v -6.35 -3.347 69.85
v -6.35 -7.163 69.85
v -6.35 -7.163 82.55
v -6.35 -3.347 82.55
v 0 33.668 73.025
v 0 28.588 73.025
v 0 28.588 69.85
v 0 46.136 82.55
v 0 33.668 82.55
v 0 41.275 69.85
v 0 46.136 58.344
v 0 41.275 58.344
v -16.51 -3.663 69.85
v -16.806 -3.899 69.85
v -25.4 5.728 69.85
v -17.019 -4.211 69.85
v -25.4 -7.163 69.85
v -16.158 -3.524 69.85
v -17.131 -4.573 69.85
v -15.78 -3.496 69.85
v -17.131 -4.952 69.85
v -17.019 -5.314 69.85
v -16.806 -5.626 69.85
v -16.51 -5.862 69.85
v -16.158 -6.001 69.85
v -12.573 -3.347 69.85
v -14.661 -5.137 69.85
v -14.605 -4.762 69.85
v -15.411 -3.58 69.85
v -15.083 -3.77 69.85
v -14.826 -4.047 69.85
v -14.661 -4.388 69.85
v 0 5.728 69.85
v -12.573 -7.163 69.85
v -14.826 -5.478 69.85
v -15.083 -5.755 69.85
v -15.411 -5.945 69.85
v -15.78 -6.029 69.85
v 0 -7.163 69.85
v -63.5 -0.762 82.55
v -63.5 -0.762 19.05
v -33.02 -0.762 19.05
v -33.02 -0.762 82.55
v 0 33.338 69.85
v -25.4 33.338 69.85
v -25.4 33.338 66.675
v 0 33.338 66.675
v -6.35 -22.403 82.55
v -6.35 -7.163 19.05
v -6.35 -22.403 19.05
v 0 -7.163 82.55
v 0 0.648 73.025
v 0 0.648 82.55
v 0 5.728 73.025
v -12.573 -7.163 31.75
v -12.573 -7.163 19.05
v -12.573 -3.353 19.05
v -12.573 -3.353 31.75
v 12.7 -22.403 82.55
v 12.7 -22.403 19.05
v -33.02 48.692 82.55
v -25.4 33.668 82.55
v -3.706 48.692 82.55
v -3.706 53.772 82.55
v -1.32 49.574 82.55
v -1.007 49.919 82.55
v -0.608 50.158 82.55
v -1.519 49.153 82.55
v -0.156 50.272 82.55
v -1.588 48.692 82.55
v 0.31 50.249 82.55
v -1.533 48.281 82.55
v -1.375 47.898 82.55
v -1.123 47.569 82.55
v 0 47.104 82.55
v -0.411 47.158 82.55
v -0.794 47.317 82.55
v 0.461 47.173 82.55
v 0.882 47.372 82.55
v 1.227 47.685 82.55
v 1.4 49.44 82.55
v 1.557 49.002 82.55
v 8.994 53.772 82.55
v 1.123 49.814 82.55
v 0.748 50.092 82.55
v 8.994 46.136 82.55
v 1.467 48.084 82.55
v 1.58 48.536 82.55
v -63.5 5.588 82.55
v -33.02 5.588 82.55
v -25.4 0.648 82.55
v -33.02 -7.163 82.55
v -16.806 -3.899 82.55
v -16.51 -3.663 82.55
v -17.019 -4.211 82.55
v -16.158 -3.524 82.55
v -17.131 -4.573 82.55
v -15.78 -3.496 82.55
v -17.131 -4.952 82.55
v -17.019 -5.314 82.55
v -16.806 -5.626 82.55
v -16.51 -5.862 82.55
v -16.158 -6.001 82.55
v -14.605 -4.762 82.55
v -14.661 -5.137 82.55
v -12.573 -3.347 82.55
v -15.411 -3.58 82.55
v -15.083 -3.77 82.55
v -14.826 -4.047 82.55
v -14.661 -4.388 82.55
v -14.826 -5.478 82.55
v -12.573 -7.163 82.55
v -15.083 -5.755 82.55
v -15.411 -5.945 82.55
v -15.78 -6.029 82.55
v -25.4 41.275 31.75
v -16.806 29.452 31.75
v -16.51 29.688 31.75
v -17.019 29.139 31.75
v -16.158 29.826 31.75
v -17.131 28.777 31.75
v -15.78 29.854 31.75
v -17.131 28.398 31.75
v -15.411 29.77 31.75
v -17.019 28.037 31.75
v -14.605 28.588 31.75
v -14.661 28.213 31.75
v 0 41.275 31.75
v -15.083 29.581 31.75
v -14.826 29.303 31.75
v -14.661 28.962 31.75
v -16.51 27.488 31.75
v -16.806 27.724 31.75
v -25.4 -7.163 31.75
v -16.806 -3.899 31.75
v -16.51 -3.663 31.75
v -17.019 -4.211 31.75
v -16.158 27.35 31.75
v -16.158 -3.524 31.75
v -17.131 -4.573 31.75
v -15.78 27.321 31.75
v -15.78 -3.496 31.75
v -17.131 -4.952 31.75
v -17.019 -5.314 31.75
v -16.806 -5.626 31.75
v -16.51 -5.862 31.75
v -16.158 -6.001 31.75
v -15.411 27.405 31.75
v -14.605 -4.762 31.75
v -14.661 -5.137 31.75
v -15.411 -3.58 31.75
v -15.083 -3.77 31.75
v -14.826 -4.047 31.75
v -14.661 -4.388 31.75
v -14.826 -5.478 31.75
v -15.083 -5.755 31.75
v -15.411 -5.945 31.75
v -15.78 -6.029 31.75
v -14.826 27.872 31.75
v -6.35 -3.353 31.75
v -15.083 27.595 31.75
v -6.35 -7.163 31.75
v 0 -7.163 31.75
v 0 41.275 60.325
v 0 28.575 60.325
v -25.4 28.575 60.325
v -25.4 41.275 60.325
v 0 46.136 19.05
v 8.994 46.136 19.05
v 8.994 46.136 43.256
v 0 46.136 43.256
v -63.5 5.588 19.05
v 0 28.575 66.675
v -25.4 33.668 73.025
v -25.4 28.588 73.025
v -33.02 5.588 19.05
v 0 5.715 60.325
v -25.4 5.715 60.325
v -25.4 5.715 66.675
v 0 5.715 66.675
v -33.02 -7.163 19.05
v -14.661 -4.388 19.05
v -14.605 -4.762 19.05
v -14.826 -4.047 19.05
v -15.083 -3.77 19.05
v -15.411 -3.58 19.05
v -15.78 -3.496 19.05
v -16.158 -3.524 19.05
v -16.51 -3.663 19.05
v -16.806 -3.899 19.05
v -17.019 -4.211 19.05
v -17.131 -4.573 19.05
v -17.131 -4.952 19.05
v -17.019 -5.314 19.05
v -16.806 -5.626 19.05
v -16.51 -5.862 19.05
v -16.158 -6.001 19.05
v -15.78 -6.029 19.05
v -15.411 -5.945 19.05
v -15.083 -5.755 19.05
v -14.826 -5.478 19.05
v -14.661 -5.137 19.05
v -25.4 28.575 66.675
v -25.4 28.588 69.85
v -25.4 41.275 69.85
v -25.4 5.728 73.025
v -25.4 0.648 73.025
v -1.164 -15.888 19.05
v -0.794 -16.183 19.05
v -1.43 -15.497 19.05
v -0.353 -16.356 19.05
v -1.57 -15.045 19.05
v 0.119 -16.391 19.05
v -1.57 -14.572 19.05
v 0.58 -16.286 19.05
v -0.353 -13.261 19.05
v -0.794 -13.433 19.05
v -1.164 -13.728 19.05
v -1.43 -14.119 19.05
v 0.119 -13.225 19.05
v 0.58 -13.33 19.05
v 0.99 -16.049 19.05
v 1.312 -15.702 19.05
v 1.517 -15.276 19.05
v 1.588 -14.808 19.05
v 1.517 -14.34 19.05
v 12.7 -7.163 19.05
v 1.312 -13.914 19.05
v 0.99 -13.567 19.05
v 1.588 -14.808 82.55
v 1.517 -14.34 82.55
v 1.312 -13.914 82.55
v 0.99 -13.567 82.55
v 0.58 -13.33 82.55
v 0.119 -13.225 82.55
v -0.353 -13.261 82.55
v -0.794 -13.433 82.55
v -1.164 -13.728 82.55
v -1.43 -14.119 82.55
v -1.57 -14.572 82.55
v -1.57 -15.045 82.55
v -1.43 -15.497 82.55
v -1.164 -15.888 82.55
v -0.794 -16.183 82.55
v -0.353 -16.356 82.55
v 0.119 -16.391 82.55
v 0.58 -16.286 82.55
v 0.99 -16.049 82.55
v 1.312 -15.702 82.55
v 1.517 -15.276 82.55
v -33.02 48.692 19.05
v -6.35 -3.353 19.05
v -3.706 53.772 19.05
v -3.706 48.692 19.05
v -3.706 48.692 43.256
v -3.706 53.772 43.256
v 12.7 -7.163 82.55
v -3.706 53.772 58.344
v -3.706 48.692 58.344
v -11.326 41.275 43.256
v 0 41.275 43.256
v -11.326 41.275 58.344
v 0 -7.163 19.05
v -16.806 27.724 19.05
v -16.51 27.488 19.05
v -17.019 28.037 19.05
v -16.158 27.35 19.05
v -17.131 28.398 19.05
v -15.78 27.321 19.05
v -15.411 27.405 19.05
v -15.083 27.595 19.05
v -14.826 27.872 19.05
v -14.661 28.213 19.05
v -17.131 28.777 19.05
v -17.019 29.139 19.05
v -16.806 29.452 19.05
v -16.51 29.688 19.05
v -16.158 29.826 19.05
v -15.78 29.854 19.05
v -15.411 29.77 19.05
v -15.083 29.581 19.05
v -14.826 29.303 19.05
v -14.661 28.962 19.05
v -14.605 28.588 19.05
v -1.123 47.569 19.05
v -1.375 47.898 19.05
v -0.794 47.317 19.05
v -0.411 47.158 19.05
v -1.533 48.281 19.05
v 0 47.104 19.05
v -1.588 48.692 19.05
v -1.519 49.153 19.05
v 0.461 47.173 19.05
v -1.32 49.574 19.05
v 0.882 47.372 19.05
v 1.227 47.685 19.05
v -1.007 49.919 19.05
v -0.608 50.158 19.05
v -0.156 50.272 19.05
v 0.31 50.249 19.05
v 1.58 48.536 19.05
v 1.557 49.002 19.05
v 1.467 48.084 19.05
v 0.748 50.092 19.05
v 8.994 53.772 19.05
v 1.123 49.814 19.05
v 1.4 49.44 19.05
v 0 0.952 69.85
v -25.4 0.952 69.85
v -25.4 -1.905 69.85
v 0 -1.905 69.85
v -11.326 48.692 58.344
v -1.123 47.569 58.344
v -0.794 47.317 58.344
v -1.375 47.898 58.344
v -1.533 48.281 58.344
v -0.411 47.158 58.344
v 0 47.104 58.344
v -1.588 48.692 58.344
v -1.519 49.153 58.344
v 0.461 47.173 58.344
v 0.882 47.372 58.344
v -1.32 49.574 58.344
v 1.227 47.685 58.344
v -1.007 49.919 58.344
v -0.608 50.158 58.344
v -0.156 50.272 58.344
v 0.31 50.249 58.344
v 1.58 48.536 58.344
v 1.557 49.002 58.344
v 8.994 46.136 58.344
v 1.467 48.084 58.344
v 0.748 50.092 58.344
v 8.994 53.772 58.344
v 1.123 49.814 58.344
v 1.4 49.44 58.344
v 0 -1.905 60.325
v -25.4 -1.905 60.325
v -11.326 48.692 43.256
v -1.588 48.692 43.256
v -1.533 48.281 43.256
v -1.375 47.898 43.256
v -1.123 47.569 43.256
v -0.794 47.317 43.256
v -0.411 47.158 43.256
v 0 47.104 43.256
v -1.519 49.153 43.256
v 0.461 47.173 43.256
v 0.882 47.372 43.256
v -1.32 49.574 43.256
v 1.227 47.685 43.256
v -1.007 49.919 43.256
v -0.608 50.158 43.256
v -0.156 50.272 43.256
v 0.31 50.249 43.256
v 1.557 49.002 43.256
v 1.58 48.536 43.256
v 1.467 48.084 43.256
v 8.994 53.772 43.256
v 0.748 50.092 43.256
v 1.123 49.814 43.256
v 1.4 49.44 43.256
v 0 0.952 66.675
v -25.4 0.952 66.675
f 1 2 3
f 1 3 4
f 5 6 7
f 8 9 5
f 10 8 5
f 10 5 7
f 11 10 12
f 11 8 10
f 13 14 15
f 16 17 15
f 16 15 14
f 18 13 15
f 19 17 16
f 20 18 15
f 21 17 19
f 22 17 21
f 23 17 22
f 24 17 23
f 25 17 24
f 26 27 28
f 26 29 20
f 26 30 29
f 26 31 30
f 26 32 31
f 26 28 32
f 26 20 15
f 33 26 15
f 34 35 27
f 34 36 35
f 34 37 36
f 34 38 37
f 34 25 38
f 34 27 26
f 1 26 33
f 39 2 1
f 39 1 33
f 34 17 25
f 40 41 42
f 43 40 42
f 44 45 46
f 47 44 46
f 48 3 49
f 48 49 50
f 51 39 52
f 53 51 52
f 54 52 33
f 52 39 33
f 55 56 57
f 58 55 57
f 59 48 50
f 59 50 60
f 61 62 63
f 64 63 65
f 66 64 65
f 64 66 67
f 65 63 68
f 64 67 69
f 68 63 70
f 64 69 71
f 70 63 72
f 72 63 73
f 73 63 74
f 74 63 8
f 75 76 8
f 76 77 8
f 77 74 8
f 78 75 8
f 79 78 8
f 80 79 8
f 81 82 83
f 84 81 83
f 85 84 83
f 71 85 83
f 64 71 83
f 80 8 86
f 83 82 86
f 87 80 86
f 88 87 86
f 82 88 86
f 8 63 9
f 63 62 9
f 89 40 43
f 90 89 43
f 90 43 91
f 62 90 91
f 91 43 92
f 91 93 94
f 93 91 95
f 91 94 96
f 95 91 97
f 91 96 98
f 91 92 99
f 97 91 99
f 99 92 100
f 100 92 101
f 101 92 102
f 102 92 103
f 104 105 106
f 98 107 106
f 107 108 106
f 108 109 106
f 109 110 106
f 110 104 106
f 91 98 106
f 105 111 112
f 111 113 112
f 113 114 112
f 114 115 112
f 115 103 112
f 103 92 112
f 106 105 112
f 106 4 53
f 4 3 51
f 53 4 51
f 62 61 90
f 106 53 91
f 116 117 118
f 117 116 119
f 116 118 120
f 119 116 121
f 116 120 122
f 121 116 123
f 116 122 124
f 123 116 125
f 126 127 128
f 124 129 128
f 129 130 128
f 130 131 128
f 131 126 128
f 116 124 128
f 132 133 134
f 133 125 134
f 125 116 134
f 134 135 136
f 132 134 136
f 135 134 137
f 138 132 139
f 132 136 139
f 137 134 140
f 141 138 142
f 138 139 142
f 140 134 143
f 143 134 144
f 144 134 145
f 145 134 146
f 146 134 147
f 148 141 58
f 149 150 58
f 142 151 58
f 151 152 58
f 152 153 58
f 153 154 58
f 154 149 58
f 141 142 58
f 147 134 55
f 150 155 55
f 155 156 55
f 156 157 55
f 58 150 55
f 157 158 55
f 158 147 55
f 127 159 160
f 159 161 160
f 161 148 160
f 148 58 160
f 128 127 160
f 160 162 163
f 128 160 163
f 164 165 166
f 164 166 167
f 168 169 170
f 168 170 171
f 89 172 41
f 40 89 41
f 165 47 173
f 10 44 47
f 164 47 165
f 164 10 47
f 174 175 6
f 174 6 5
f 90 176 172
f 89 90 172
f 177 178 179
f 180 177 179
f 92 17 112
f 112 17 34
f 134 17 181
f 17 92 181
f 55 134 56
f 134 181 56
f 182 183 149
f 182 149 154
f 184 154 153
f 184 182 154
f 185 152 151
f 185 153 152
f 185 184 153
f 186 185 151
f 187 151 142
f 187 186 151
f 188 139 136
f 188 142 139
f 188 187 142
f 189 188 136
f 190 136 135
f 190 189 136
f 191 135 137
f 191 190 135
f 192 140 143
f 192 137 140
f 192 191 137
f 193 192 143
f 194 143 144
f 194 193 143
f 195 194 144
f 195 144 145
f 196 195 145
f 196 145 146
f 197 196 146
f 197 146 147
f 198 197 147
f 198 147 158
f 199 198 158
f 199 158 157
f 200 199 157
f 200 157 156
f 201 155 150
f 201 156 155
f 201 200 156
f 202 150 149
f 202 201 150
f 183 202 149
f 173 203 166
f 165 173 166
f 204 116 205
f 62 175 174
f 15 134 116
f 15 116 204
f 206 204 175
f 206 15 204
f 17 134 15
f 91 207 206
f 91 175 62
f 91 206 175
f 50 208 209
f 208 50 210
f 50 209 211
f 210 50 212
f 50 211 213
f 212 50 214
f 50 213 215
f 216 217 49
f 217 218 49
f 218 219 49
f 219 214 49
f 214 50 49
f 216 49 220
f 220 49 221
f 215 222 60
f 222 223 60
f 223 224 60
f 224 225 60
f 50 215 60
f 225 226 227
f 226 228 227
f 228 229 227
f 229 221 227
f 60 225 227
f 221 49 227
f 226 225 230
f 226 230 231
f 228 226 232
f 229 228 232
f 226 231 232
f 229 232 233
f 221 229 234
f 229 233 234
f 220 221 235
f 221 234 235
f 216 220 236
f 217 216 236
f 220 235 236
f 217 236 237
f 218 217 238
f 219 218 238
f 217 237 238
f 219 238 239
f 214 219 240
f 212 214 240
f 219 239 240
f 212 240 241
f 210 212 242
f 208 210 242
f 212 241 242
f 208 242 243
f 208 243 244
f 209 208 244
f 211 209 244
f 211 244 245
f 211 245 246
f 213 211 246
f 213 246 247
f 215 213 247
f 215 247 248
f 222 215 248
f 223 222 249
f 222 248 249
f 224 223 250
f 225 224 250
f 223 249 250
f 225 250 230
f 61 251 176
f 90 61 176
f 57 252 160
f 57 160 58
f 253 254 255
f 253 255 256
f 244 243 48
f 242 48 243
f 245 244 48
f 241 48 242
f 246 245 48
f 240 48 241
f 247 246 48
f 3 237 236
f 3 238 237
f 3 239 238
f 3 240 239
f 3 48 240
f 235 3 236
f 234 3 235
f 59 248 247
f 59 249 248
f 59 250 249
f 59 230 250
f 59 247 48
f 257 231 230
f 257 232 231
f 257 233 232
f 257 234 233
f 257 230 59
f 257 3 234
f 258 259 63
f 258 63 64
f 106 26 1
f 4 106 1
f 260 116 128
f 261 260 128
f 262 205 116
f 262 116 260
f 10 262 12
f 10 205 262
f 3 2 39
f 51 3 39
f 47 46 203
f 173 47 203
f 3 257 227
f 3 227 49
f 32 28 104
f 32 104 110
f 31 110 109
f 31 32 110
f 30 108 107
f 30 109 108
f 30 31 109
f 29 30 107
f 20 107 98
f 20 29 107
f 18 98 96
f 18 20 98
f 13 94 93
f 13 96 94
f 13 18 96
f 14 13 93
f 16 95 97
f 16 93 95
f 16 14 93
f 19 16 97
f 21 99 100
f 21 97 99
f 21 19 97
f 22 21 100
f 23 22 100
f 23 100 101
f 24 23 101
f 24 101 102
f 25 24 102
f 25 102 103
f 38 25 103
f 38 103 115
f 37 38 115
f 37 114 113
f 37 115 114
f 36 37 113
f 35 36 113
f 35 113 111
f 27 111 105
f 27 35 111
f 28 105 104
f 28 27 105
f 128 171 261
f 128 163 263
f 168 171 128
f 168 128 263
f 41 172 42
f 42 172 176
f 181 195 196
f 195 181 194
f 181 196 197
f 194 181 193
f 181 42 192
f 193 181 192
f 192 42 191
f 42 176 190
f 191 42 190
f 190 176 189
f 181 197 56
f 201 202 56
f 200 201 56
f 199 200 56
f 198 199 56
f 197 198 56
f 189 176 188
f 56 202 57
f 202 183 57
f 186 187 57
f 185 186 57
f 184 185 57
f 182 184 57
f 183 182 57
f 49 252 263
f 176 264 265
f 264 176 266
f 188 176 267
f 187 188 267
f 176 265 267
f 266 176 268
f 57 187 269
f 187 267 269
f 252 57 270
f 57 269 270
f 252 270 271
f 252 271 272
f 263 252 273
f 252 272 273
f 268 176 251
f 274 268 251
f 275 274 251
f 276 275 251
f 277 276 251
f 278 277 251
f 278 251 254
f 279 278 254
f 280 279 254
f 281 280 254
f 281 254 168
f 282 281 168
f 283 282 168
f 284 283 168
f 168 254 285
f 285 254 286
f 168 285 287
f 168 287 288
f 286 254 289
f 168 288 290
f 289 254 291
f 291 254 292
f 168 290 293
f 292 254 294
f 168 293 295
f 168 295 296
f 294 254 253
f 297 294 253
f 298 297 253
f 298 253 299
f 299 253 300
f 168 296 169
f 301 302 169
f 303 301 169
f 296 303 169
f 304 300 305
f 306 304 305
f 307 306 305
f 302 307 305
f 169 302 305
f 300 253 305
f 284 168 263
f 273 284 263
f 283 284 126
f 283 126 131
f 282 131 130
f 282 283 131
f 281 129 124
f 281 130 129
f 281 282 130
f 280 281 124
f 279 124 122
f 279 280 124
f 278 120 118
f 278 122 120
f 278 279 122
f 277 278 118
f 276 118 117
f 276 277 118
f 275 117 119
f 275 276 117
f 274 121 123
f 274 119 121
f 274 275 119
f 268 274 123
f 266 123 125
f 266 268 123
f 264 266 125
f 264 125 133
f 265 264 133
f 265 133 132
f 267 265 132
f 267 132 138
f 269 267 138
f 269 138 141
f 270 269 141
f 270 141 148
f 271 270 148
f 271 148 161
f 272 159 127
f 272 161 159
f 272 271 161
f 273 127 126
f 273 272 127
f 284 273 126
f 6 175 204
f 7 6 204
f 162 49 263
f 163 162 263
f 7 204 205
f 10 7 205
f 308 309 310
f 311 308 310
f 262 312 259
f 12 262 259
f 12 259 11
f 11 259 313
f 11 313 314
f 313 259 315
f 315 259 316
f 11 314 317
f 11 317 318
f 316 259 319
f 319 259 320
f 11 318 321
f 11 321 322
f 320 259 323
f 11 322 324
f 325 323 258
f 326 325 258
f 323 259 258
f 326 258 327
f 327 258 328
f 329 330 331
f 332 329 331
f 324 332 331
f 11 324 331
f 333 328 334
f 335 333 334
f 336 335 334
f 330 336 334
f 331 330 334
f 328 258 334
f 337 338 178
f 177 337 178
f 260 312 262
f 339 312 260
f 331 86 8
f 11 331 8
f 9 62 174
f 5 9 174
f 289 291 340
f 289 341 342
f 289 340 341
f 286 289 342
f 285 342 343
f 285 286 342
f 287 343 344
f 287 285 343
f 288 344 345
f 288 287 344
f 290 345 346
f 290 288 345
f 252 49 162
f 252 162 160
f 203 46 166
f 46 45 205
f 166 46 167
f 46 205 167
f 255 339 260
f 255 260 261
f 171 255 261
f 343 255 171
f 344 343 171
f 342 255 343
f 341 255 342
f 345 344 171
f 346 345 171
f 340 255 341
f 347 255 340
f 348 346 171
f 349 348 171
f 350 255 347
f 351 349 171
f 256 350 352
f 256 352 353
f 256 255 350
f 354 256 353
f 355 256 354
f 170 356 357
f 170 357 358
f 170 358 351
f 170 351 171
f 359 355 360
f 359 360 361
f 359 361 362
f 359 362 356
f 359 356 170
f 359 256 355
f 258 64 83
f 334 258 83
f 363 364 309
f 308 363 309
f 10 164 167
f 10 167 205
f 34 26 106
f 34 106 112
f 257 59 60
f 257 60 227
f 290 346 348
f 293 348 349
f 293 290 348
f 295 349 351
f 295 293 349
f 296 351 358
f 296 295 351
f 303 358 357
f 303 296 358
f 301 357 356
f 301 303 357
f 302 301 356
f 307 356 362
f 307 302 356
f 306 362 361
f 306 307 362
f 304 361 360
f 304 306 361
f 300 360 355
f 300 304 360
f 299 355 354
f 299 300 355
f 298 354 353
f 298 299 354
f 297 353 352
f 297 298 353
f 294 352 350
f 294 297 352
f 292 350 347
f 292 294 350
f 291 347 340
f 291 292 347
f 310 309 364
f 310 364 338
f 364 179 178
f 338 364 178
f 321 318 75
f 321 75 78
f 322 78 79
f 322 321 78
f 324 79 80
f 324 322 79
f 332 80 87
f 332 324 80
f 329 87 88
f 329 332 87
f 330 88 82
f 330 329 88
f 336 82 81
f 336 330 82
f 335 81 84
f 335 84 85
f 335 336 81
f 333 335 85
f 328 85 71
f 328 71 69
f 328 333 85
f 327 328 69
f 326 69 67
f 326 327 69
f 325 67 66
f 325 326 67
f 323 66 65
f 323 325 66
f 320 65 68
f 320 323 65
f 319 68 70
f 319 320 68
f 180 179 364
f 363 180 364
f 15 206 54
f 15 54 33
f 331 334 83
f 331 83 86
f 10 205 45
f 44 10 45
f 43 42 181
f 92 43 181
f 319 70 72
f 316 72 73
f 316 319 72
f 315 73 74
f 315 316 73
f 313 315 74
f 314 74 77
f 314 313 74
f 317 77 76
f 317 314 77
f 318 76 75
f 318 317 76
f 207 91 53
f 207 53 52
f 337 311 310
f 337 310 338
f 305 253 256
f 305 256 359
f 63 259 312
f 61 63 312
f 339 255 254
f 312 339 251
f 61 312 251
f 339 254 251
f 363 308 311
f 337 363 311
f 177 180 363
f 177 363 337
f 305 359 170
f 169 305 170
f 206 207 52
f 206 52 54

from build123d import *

# Parameters (mm, degrees)
SKETCH8_R                = 1.27
BOSS_EXTRUDE3_DEPTH      = 101.6
SKETCH40_W               = 25.4
SKETCH40_H               = 38.1
CUT_EXTRUDE24_DEPTH      = 50.8
CUT_EXTRUDE11_DEPTH      = 130.327883255
CUT_EXTRUDE11_DEPTH_BACK = 101.6
SKETCH18_W               = 33.02
SKETCH18_H               = 2.3622
BOSS_EXTRUDE4_DEPTH      = 101.6
CUT_EXTRUDE12_START      = -101.6
SKETCH20_R               = 1.5875
CUT_EXTRUDE12_DEPTH      = 101.6
SKETCH21_W               = 33.02
SKETCH21_H               = 19.05
CUT_EXTRUDE13_DEPTH      = 135.416648809
SKETCH24_W               = 8.993546066
SKETCH24_H               = 19.05
CUT_EXTRUDE15_DEPTH      = 135.416648809
SKETCH38_W               = 15.0876
SKETCH38_H               = 7.635884817
CUT_EXTRUDE21_DEPTH      = 20.32
SKETCH41_W               = 30.48
SKETCH41_H               = 19.05
CUT_EXTRUDE25_DEPTH      = 130.137479387
SKETCH43_W               = 12.7
SKETCH43_H               = 33.02
CUT_EXTRUDE26_DEPTH      = 25.4
SKETCH44_W               = 3.175
SKETCH44_H               = 5.08
BOSS_EXTRUDE5_DEPTH      = 25.4
BOSS_EXTRUDE6_DEPTH      = 25.4
BOSS_EXTRUDE6_2_DEPTH    = 25.4
SKETCH46_R               = 1.5875
BOSS_EXTRUDE7_DEPTH      = 63.5
CUT_EXTRUDE29_DEPTH      = 105.670466108
CUT_EXTRUDE29_DEPTH_BACK = 12.7
SKETCH49_W               = 6.223
SKETCH49_H               = 3.81
CUT_EXTRUDE31_DEPTH      = 12.7
SKETCH50_W               = 11.326453934
SKETCH50_H               = 15.0876
CUT_EXTRUDE33_DEPTH      = 4.8768


with BuildPart() as part:
    # Sketch8 → Boss-Extrude3 (new body)
    with BuildSketch(Plane.XY):
        Polygon((0, 0), (0, 48.6918), (-33.02, 48.6918), (-33.02, 5.588), (-63.5, 5.588), (-63.5, -0.762), (-33.02, -0.762), (-33.02, -9.525), (-9.525, -9.525), (0, -9.525), align=None)
        with Locations((-15.875, 28.5877)):
            Circle(SKETCH8_R, mode=Mode.SUBTRACT)
        with Locations((-15.875, -4.7625)):
            Circle(SKETCH8_R, mode=Mode.SUBTRACT)
    extrude(amount=BOSS_EXTRUDE3_DEPTH)

    # Sketch40 → Cut-Extrude24 (cut)
    with BuildSketch(Plane.XZ.offset(9.525)):
        with Locations((-12.7, 50.8)):
            Rectangle(SKETCH40_W, SKETCH40_H)
    extrude(amount=-CUT_EXTRUDE24_DEPTH, mode=Mode.SUBTRACT)

    # Sketch18 → Cut-Extrude11 (cut, two sides: drawn at the far end of the back side and taken through both)
    with BuildSketch(Plane.XY.offset(101.6).offset(-CUT_EXTRUDE11_DEPTH_BACK)):
        with Locations((-16.51, -8.3439)):
            Rectangle(SKETCH18_W, SKETCH18_H)
    extrude(amount=CUT_EXTRUDE11_DEPTH + CUT_EXTRUDE11_DEPTH_BACK, mode=Mode.SUBTRACT)

    # Sketch19 → Boss-Extrude4 (add)
    with BuildSketch(Plane(origin=(0, 0, 0), x_dir=(-1, 0, 0), z_dir=(0, 0, -1))):
        with BuildLine():
            Line((1.5875, 48.6918), (3.706453934, 48.6918))
            Line((3.706453934, 48.6918), (3.706453934, 53.7718))
            Line((3.706453934, 53.7718), (-8.993546066, 53.7718))
            Line((-8.993546066, 53.7718), (-8.993546066, 46.135915183))
            Line((-8.993546066, 46.135915183), (0, 46.135915183))
            Line((0, 46.135915183), (0, 47.1043))
            ThreePointArc((0, 47.1043), (-1.122532015, 49.814332015), (1.5875, 48.6918))
        make_face()
    extrude(amount=-BOSS_EXTRUDE4_DEPTH)

    # Sketch20 → Cut-Extrude12 (cut)
    with BuildSketch(Plane.XY.offset(101.6).offset(CUT_EXTRUDE12_START)):
        with Locations(Location((0, 48.6918, 0), (0, 0, 180))):
            Circle(SKETCH20_R)
    extrude(amount=CUT_EXTRUDE12_DEPTH, mode=Mode.SUBTRACT)

    # Sketch21 → Cut-Extrude13 (cut, through all)
    with BuildSketch(Plane.XZ.offset(7.1628)):
        with Locations((-16.51, 92.075)):
            Rectangle(SKETCH21_W, SKETCH21_H)
        with Locations((-16.51, 9.525)):
            Rectangle(SKETCH21_W, SKETCH21_H)
    extrude(amount=-CUT_EXTRUDE13_DEPTH, mode=Mode.SUBTRACT)

    # Sketch24 → Cut-Extrude15 (cut, through all)
    with BuildSketch(Plane(origin=(0, 53.7718, 0), x_dir=(1, 0, 0), z_dir=(0, 1, 0))):
        with Locations((4.496773033, -92.075)):
            Rectangle(SKETCH24_W, SKETCH24_H)
        with Locations((4.496773033, -9.525)):
            Rectangle(SKETCH24_W, SKETCH24_H)
    extrude(amount=-CUT_EXTRUDE15_DEPTH, mode=Mode.SUBTRACT)

    # Sketch38 → Cut-Extrude21 (cut)
    with BuildSketch(Plane(origin=(8.993546066, 0, 0), x_dir=(0, 0, -1), z_dir=(1, 0, 0))):
        with Locations((-50.8, 49.953857592)):
            Rectangle(SKETCH38_W, SKETCH38_H)
    extrude(amount=-CUT_EXTRUDE21_DEPTH, mode=Mode.SUBTRACT)

    # Sketch41 → Cut-Extrude25 (cut, through all)
    with BuildSketch(Plane(origin=(0, 5.588, 0), x_dir=(1, 0, 0), z_dir=(0, 1, 0))):
        with Locations((-48.26, -9.525)):
            Rectangle(SKETCH41_W, SKETCH41_H)
        with Locations((-48.26, -92.075)):
            Rectangle(SKETCH41_W, SKETCH41_H)
    extrude(amount=-CUT_EXTRUDE25_DEPTH, mode=Mode.SUBTRACT)

    # Sketch43 → Cut-Extrude26 (cut)
    with BuildSketch(Plane(origin=(0, 0, 0), x_dir=(0, 0, -1), z_dir=(1, 0, 0))):
        with Locations((-76.2, 17.1577)):
            Rectangle(SKETCH43_W, SKETCH43_H)
    extrude(amount=-CUT_EXTRUDE26_DEPTH, mode=Mode.SUBTRACT)

    # Sketch44 → Boss-Extrude5 (add)
    with BuildSketch(Plane(origin=(-25.4, 0, 0), x_dir=(0, 0, -1), z_dir=(1, 0, 0))):
        with Locations((-71.4375, 31.1277)):
            Rectangle(SKETCH44_W, SKETCH44_H)
        with Locations((-71.4375, 3.1877)):
            Rectangle(SKETCH44_W, SKETCH44_H)
    extrude(amount=BOSS_EXTRUDE5_DEPTH)

    # Sketch48 → Cut-Extrude29 (cut, two sides: drawn at the far end of the back side and taken through both)
    with BuildSketch(Plane.XY.offset(82.55).offset(-CUT_EXTRUDE29_DEPTH_BACK)):
        Polygon((-12.573, -184.245390082), (-12.573, -7.1628), (-12.573, -3.346799078), (-6.35, -3.346799078), (-6.35, -7.1628), (-6.35, -184.245390082), (-6.35, -538.410570247), (-12.573, -538.410570247), align=None)
    extrude(amount=CUT_EXTRUDE29_DEPTH + CUT_EXTRUDE29_DEPTH_BACK, mode=Mode.SUBTRACT)

    # Sketch49 → Cut-Extrude31 (cut)
    with BuildSketch(Plane(origin=(0, 0, 19.05), x_dir=(-1, 0, 0), z_dir=(0, 0, -1))):
        with Locations((9.4615, -5.2578)):
            Rectangle(SKETCH49_W, SKETCH49_H)
    extrude(amount=-CUT_EXTRUDE31_DEPTH, mode=Mode.SUBTRACT)

    # Sketch50 → Cut-Extrude33 (cut)
    with BuildSketch(Plane(origin=(0, 46.135915183, 0), x_dir=(1, 0, 0), z_dir=(0, 1, 0))):
        with Locations((-5.663226967, -50.8)):
            Rectangle(SKETCH50_W, SKETCH50_H)
    extrude(amount=-CUT_EXTRUDE33_DEPTH, mode=Mode.SUBTRACT)


with BuildPart() as body_2:
    # Sketch45 → Boss-Extrude6 (new body)
    with BuildSketch(Plane(origin=(-25.4, 0, 0), x_dir=(0, 0, -1), z_dir=(1, 0, 0))):
        Polygon((-60.325, -1.905), (-60.325, 5.715), (-66.675, 5.715), (-66.675, 0.9525), (-69.85, 0.9525), (-69.85, -1.905), align=None)
    extrude(amount=BOSS_EXTRUDE6_DEPTH)


with BuildPart() as body_3:
    # Sketch45 → Boss-Extrude6 2 (new body)
    with BuildSketch(Plane(origin=(-25.4, 0, 0), x_dir=(0, 0, -1), z_dir=(1, 0, 0))):
        Polygon((-60.325, 41.275), (-69.85, 41.275), (-69.85, 33.3375), (-66.675, 33.3375), (-66.675, 28.575), (-60.325, 28.575), align=None)
    extrude(amount=BOSS_EXTRUDE6_2_DEPTH)


with BuildPart() as body_4:
    # Sketch46 → Boss-Extrude7 (new body)
    with BuildSketch(Plane.XY.offset(82.55)):
        Polygon((12.7, -7.1628), (0, -7.1628), (-6.35, -7.1628), (-6.35, -22.4028), (12.7, -22.4028), align=None)
        with Locations((0, -14.8082)):
            Circle(SKETCH46_R, mode=Mode.SUBTRACT)
    extrude(amount=-BOSS_EXTRUDE7_DEPTH)


solid = Compound([part.part, body_2.part, body_3.part, body_4.part])
